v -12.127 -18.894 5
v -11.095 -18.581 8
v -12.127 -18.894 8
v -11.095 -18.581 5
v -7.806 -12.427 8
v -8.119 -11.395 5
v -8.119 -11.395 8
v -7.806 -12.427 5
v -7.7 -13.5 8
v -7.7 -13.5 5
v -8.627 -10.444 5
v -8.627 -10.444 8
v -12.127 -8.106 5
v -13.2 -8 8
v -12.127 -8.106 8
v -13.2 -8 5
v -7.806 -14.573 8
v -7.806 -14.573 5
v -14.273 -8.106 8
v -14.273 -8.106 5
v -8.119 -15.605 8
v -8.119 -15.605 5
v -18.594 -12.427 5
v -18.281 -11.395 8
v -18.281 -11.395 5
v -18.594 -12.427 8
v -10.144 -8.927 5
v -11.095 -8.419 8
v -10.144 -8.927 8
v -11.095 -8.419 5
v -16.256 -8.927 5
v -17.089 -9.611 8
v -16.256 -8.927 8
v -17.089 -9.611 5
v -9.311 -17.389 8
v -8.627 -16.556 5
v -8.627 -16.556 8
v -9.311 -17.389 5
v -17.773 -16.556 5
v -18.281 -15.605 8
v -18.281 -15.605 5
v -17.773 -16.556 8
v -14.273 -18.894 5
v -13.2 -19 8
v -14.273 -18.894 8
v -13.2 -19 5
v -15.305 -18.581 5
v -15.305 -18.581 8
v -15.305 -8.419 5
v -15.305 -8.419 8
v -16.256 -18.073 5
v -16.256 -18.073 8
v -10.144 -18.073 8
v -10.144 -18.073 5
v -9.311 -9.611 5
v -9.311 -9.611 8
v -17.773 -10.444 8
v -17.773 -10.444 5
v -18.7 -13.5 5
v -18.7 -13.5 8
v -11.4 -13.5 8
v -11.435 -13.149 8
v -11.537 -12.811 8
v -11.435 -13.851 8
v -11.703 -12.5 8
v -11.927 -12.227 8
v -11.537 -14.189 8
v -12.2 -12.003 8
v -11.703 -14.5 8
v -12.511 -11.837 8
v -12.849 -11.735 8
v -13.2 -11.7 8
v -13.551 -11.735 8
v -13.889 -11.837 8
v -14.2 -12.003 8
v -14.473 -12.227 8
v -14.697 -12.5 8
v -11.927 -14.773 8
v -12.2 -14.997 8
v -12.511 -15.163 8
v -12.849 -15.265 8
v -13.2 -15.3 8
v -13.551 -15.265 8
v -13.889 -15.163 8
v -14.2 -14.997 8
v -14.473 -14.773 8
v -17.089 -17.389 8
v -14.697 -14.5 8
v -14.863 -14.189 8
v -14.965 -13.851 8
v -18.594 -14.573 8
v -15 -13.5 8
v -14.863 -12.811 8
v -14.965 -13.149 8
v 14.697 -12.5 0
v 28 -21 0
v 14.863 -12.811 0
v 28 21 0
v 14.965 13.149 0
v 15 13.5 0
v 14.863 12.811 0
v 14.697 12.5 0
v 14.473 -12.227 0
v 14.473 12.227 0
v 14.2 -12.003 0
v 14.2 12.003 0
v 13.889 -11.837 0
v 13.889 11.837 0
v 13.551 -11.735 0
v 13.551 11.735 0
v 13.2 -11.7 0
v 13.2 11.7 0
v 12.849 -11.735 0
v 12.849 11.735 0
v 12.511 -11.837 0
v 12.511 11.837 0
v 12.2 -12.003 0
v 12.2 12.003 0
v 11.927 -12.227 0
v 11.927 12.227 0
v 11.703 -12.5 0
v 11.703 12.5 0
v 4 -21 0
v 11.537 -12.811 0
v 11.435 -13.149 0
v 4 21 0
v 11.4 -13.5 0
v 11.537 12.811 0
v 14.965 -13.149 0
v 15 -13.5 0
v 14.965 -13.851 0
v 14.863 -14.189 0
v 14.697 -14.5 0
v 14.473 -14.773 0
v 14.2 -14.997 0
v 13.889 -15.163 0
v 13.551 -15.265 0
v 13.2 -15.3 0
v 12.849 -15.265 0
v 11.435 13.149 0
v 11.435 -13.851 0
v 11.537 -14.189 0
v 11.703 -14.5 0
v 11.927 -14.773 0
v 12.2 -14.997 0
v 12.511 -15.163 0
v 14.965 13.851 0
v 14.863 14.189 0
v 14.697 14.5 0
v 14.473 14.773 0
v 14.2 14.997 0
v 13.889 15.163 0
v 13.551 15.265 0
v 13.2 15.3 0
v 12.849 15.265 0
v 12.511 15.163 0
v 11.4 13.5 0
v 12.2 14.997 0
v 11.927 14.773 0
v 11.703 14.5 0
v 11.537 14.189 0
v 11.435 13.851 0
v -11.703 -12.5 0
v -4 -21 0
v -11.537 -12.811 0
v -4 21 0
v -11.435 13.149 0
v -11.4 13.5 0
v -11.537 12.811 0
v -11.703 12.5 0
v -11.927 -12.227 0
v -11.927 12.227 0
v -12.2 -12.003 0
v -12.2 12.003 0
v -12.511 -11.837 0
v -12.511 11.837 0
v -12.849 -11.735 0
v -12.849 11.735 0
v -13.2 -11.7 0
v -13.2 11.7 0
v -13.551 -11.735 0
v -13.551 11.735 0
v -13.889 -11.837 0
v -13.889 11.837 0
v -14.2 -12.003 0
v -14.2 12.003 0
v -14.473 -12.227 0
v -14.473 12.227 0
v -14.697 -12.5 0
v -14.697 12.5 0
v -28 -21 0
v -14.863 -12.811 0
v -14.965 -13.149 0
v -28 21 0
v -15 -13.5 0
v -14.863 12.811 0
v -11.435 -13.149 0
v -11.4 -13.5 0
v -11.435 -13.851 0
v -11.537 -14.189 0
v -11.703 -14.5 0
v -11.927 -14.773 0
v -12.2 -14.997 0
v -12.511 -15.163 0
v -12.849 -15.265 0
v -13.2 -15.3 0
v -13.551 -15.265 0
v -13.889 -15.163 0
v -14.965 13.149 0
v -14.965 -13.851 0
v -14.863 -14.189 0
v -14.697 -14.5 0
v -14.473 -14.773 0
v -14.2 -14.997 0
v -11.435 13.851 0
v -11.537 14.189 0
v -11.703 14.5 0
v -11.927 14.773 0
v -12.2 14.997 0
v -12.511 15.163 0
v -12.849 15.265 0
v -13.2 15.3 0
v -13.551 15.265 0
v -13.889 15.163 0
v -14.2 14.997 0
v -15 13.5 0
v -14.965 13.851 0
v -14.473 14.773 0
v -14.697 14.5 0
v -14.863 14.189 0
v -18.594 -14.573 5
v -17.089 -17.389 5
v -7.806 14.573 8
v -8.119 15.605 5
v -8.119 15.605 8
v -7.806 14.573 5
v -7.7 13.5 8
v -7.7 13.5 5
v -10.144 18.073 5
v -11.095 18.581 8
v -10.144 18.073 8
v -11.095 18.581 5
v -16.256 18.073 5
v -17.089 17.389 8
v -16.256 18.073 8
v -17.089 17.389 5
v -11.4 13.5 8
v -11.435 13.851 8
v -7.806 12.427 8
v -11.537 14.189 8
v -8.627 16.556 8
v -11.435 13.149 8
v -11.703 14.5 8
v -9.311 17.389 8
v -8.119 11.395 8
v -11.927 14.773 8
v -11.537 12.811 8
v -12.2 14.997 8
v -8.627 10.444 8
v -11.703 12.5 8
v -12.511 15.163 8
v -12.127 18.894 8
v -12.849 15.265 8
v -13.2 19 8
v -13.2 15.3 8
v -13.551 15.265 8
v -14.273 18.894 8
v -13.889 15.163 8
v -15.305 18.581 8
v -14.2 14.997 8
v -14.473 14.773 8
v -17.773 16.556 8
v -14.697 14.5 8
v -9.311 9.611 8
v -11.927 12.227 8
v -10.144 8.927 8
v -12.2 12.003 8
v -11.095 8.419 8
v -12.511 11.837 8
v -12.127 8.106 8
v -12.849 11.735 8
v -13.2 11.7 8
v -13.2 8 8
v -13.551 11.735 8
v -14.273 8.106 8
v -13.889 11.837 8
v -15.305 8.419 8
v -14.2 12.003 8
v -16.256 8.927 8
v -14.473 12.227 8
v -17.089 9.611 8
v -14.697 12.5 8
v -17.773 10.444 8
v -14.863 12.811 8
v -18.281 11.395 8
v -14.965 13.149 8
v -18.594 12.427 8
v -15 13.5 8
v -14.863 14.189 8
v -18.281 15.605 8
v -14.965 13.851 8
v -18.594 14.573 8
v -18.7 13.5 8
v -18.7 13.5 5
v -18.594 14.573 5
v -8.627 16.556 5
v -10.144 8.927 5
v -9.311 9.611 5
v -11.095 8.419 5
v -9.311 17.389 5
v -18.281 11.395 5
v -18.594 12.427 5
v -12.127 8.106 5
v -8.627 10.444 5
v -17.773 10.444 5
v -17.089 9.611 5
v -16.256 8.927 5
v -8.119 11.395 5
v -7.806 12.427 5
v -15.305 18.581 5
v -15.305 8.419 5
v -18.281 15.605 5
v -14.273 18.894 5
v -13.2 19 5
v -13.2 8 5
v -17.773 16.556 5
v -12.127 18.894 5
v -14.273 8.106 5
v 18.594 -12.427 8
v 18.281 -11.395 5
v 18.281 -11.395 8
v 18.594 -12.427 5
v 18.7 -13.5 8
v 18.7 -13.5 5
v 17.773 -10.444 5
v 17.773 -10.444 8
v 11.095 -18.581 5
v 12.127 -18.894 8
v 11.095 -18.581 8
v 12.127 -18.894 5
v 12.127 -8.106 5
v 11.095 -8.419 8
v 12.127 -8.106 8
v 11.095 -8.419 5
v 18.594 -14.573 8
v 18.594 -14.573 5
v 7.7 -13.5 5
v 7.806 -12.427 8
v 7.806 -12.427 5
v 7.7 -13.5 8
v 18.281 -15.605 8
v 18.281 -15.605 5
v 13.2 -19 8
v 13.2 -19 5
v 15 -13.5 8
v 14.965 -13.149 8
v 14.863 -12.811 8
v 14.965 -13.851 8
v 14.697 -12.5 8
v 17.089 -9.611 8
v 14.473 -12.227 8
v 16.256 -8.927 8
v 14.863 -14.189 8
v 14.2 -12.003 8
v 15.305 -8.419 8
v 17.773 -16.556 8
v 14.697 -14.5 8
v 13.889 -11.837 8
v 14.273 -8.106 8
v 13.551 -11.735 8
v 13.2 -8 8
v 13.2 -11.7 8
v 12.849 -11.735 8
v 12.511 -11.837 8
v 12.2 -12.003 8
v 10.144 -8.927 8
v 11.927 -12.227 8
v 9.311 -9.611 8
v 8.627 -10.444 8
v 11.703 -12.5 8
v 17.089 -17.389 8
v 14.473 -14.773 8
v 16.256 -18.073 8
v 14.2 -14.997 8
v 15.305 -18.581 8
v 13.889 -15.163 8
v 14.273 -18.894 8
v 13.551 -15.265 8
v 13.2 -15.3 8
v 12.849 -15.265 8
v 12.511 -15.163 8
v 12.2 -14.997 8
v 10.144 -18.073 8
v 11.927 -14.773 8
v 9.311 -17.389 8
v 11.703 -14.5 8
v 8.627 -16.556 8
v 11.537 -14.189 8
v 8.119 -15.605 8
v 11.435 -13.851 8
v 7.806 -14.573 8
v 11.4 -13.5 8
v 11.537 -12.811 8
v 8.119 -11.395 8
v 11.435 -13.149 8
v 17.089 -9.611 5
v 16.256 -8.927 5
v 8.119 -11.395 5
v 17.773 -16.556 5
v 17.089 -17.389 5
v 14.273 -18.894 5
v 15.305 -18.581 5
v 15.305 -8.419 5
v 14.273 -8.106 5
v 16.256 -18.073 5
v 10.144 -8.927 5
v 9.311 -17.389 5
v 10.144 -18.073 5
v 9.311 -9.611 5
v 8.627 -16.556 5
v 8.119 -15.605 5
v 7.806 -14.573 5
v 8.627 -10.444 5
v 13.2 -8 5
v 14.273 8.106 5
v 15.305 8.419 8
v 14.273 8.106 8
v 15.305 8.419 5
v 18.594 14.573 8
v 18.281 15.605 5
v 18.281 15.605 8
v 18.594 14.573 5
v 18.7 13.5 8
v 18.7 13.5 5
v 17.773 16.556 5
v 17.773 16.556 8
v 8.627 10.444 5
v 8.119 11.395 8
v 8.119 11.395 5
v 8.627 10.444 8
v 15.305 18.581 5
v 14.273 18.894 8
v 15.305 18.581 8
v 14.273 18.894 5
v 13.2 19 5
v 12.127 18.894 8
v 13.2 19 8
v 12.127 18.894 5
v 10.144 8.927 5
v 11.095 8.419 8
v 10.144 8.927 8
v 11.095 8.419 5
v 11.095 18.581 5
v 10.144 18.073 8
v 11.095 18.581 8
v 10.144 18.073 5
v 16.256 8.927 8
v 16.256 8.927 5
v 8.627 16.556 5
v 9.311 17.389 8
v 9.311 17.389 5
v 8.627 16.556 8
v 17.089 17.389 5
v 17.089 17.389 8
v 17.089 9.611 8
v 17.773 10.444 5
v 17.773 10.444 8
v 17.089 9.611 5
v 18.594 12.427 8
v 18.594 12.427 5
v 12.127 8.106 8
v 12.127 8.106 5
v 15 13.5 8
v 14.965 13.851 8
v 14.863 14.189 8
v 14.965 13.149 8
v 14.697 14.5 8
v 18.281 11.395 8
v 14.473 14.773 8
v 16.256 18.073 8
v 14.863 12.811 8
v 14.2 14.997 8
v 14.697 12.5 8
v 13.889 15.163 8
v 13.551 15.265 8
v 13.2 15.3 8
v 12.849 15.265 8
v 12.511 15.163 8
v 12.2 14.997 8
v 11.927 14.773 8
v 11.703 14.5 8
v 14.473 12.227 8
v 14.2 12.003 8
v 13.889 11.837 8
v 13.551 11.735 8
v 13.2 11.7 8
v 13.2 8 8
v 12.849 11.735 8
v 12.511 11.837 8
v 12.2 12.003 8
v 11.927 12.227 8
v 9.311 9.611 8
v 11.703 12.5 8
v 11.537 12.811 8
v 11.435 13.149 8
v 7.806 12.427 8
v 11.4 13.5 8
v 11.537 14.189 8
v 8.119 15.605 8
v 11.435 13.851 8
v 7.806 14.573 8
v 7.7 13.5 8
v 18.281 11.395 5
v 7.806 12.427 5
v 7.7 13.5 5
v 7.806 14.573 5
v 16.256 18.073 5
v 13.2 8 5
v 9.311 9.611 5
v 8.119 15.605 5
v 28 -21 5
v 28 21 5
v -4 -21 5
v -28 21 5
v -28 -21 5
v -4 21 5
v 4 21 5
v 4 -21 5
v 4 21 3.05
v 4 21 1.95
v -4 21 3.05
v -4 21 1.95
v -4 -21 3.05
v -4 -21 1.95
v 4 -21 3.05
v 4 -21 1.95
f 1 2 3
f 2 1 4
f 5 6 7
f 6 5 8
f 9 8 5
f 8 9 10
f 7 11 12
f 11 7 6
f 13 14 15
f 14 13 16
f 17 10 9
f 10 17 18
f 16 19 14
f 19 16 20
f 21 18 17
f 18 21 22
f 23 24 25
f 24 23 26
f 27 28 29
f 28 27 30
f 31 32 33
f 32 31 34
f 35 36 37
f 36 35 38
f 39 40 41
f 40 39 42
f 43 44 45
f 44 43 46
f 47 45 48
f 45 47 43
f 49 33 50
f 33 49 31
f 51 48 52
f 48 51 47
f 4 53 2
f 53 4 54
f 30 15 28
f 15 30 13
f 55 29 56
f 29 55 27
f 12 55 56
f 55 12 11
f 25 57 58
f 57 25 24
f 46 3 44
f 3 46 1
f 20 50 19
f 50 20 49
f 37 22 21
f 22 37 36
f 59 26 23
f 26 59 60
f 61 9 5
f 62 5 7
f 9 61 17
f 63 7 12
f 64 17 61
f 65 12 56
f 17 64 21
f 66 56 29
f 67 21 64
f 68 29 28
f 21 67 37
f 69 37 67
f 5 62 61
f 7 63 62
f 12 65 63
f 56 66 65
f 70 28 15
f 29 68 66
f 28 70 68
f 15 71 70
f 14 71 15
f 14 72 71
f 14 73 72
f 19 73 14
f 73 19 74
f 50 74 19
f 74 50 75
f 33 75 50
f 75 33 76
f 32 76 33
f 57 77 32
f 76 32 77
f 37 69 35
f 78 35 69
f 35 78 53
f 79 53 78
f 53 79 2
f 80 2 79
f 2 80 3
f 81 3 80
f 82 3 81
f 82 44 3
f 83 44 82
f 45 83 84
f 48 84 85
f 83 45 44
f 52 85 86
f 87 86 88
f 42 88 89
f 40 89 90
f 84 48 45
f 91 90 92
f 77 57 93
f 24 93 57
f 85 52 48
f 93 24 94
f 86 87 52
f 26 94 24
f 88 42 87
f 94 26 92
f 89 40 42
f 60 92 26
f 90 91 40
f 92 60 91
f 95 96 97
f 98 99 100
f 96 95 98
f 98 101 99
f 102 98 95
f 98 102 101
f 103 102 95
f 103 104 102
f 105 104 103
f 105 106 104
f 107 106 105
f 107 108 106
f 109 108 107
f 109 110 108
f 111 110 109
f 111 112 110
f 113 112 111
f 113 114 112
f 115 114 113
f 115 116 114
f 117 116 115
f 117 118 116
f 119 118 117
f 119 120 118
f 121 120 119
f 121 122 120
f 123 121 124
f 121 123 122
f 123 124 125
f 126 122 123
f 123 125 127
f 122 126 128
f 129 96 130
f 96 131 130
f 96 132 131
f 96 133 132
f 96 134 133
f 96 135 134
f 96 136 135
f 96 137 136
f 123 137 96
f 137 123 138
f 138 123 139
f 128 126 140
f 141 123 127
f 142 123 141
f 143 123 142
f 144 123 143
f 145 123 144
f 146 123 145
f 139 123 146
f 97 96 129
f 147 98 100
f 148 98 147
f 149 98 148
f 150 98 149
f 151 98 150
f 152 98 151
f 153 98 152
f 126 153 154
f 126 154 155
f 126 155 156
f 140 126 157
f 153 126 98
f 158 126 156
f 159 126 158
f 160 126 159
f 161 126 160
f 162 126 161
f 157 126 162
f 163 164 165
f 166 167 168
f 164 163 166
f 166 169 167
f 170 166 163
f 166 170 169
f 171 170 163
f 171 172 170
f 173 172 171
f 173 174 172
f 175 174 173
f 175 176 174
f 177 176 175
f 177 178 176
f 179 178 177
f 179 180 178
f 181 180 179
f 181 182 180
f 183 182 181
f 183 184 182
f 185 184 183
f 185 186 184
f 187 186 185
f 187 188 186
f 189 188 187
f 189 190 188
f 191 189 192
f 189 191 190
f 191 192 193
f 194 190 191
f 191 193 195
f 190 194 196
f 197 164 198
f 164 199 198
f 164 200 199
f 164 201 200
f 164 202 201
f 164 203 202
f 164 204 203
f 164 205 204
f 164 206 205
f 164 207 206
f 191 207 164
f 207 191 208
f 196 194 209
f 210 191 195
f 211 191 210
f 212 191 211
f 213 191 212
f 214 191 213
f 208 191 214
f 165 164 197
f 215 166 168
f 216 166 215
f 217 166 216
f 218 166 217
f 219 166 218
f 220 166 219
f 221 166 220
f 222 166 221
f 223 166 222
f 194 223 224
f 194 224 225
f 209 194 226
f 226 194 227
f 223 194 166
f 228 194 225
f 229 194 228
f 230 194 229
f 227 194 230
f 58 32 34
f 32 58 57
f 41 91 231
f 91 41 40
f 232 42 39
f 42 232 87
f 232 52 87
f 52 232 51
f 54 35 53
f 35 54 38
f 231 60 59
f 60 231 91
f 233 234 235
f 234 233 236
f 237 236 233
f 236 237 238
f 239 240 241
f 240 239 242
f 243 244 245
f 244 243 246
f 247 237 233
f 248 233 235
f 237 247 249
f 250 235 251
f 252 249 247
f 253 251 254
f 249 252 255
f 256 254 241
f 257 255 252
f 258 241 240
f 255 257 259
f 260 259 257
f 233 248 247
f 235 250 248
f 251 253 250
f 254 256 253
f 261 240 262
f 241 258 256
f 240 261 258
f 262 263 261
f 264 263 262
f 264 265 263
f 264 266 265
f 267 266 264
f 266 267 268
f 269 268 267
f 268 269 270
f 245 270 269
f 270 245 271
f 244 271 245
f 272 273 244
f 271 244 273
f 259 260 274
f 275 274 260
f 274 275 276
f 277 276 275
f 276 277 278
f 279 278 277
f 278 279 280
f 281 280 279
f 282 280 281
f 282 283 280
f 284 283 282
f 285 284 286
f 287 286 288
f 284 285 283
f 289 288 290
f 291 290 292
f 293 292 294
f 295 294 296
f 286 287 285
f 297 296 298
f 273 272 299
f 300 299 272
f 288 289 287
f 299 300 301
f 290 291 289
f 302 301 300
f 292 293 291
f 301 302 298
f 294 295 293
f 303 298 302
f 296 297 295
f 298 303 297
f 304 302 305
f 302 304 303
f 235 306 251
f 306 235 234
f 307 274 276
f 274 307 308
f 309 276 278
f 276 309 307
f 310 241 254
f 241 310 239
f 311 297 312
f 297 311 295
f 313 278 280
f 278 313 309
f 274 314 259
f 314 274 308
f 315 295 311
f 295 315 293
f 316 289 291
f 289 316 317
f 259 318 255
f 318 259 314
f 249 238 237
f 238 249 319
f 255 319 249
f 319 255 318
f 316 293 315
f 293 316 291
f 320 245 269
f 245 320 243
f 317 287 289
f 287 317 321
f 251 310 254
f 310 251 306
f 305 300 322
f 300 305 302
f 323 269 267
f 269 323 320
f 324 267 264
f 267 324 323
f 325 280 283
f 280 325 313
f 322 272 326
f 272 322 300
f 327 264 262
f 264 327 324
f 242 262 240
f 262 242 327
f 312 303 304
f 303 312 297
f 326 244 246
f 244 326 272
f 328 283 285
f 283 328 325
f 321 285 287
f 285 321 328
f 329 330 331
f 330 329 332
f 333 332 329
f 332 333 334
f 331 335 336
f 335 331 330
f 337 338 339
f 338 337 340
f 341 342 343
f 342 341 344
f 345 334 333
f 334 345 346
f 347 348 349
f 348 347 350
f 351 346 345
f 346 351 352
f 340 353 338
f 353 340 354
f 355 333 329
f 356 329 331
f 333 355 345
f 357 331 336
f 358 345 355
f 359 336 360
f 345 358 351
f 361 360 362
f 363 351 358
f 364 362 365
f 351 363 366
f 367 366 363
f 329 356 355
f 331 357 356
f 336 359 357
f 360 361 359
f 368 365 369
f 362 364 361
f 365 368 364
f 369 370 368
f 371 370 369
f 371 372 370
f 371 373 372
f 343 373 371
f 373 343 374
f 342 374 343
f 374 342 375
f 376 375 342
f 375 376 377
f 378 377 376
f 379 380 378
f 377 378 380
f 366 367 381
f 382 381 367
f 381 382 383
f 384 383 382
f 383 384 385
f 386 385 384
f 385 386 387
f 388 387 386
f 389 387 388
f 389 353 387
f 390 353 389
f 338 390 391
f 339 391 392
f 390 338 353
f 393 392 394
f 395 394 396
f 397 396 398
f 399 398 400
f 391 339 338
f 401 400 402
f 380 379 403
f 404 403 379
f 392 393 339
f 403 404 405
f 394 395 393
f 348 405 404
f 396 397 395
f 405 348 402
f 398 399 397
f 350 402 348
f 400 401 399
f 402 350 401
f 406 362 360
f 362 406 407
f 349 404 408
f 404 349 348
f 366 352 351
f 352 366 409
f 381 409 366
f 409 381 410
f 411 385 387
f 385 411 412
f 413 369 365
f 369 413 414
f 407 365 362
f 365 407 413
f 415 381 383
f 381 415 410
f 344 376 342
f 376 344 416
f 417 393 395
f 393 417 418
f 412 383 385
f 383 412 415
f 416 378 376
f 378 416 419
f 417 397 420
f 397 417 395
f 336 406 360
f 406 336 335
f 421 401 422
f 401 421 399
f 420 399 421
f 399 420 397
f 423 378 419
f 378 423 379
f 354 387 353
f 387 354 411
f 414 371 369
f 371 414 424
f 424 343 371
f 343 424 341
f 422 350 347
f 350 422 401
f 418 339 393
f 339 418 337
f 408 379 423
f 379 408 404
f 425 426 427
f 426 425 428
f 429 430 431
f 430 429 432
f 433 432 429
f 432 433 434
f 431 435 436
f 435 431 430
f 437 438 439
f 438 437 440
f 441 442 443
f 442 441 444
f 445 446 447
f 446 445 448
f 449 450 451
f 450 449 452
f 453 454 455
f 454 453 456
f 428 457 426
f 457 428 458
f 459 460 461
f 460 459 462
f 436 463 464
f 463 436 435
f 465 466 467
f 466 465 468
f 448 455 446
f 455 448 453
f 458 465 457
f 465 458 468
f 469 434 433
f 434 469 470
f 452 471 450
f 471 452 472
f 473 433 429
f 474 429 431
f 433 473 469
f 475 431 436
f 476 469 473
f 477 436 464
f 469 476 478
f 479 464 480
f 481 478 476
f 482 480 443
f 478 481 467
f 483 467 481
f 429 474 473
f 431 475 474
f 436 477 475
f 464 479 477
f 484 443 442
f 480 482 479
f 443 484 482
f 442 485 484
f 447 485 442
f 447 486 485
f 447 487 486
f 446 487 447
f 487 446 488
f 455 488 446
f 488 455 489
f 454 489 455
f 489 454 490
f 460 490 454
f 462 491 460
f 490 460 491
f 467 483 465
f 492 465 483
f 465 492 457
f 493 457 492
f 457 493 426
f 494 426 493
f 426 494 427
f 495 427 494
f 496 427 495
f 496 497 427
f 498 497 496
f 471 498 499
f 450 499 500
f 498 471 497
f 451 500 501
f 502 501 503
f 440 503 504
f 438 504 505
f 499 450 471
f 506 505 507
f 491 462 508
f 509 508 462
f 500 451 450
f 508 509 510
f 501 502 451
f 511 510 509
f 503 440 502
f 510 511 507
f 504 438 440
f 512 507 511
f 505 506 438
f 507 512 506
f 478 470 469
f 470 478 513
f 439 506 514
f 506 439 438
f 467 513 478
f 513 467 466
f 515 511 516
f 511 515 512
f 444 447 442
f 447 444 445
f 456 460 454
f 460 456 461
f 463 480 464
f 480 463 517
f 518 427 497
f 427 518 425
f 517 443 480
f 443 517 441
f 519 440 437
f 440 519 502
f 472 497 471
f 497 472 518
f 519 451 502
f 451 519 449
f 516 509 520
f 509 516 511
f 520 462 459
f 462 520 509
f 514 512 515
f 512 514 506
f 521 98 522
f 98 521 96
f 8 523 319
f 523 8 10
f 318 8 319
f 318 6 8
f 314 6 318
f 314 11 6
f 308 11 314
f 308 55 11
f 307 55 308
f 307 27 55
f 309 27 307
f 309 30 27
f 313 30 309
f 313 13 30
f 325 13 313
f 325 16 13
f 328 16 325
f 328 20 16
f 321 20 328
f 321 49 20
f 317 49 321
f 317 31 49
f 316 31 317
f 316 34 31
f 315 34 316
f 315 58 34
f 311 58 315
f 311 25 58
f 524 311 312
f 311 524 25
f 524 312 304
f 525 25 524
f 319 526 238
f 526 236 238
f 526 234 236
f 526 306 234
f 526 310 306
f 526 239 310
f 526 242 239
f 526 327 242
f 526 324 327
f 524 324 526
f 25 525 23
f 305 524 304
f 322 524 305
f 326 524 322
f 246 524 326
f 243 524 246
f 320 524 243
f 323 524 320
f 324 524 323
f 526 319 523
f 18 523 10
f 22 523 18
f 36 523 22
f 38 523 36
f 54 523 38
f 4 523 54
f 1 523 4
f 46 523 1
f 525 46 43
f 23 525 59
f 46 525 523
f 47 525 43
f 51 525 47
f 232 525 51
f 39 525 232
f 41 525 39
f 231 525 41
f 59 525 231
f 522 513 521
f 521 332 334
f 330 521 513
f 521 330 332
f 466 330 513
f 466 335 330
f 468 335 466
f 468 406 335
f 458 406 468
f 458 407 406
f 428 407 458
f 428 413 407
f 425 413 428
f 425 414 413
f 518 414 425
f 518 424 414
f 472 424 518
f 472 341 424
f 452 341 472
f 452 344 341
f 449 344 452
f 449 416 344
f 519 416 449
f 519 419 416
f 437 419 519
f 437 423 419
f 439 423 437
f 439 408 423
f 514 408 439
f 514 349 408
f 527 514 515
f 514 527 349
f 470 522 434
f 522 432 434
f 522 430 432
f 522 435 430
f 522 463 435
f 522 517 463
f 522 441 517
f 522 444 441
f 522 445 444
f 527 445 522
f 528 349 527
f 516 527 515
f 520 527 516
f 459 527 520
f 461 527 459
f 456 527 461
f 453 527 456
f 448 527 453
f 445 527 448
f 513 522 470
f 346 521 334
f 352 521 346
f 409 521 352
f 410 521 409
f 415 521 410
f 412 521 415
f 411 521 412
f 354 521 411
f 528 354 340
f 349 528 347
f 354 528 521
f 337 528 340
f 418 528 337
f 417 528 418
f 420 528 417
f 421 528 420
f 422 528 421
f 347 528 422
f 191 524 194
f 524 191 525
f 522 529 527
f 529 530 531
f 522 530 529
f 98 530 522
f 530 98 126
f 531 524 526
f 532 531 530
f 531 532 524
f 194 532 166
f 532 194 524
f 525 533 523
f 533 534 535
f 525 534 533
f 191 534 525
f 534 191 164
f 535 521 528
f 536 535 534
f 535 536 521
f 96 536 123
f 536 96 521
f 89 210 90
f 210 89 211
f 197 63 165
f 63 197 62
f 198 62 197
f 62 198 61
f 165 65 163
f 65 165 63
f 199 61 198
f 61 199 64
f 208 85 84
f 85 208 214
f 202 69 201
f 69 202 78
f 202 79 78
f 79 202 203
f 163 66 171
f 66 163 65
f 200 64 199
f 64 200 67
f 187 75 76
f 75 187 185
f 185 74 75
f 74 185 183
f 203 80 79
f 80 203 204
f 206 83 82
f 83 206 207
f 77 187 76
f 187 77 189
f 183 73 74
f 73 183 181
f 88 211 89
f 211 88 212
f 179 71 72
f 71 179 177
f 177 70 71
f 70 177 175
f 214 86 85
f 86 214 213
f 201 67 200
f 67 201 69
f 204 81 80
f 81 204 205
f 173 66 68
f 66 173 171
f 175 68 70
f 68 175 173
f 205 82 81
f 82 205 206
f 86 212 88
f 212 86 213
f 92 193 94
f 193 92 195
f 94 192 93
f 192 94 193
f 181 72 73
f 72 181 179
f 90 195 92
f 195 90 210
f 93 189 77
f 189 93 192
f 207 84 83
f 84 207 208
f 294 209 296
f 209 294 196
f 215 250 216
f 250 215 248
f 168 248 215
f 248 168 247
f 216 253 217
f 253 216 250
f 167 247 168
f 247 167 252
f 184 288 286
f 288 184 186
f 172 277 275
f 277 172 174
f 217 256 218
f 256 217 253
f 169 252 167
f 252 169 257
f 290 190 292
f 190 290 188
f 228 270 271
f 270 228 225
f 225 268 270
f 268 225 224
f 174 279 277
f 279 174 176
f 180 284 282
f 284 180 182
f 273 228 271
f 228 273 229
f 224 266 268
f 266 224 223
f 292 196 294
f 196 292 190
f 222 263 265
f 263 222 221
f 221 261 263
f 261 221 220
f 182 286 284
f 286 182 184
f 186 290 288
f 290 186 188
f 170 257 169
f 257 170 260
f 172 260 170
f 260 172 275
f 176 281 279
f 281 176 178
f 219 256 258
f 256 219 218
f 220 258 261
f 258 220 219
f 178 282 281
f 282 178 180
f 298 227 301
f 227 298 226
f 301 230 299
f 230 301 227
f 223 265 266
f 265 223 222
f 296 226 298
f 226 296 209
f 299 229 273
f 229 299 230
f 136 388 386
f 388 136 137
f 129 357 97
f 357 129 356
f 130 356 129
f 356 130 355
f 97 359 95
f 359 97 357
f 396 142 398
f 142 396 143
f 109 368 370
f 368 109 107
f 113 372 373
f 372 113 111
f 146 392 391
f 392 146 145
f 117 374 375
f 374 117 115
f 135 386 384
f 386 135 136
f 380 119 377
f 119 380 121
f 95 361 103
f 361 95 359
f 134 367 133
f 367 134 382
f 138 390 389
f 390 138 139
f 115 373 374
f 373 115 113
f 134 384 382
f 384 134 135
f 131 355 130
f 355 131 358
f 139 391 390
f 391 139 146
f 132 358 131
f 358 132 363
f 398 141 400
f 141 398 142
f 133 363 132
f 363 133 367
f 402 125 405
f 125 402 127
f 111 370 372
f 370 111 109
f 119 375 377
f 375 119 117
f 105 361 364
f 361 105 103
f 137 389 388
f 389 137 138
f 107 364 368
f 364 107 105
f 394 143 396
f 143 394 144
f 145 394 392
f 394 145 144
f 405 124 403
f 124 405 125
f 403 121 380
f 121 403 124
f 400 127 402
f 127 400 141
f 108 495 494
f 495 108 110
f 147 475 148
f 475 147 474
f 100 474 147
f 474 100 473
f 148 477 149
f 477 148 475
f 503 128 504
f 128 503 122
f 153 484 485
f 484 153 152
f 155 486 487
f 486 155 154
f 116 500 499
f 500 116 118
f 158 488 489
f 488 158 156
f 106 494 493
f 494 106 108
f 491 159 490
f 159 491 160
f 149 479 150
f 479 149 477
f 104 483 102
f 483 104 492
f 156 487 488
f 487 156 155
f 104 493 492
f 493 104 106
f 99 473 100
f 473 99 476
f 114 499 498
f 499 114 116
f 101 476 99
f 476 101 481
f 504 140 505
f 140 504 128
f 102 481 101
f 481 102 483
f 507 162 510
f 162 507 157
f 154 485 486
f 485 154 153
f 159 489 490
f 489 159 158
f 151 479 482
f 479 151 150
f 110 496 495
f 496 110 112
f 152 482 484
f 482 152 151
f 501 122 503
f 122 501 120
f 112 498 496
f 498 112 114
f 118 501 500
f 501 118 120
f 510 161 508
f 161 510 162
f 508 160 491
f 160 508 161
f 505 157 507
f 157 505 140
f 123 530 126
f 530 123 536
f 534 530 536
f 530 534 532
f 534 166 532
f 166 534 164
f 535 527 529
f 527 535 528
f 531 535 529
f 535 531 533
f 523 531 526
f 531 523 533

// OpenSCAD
$fn = 32;

// ----------------------------------------------------------------------
// Living hinge: 56 x 42 mm plates, 1.1 mm flexible web
// ----------------------------------------------------------------------

// --- parameters (mm) ---
plate_len = 24;           // plate length outside the web
plate_w = 42;             // plate width
thick = 5;                // plate thickness
web_half = 4;             // half width of the flex band
web_t = 1.1;              // flexible web thickness
web_z = 1.95;             // web position inside the thickness
boss_d = 11;              // screw boss diameter
boss_h = 8;               // screw boss height
boss_x = 13.2;            // screw boss distance from the web
screw_d = 3.6;            // screw hole

difference() {
  union() {
    /* one flat strip, later thinned at the middle */
    translate([-28, -21, 0]) cube([56, 42, 5]);
    /* screw bosses, sunk 0.5 mm into the plates */
    for (sx = [-13.2, 13.2]) {
      for (sy = [-13.5, 13.5]) {
        translate([sx, sy, 0]) cylinder(h = boss_h, d = boss_d);
      }
    }
  }
  /* channel from below: leaves the web on top of it */
  translate([-4, -23.5, -2.5]) cube([8, 47, 4.45]);
  /* channel from above: thins the web down to web_t */
  translate([-4, -23.5, 3.05]) cube([8, 47, 4.45]);
  /* screw holes through the bosses */
  for (sx = [-13.2, 13.2]) {
    for (sy = [-13.5, 13.5]) {
      translate([sx, sy, -2.5]) cylinder(h = boss_h + 5, d = screw_d);
    }
  }
}
